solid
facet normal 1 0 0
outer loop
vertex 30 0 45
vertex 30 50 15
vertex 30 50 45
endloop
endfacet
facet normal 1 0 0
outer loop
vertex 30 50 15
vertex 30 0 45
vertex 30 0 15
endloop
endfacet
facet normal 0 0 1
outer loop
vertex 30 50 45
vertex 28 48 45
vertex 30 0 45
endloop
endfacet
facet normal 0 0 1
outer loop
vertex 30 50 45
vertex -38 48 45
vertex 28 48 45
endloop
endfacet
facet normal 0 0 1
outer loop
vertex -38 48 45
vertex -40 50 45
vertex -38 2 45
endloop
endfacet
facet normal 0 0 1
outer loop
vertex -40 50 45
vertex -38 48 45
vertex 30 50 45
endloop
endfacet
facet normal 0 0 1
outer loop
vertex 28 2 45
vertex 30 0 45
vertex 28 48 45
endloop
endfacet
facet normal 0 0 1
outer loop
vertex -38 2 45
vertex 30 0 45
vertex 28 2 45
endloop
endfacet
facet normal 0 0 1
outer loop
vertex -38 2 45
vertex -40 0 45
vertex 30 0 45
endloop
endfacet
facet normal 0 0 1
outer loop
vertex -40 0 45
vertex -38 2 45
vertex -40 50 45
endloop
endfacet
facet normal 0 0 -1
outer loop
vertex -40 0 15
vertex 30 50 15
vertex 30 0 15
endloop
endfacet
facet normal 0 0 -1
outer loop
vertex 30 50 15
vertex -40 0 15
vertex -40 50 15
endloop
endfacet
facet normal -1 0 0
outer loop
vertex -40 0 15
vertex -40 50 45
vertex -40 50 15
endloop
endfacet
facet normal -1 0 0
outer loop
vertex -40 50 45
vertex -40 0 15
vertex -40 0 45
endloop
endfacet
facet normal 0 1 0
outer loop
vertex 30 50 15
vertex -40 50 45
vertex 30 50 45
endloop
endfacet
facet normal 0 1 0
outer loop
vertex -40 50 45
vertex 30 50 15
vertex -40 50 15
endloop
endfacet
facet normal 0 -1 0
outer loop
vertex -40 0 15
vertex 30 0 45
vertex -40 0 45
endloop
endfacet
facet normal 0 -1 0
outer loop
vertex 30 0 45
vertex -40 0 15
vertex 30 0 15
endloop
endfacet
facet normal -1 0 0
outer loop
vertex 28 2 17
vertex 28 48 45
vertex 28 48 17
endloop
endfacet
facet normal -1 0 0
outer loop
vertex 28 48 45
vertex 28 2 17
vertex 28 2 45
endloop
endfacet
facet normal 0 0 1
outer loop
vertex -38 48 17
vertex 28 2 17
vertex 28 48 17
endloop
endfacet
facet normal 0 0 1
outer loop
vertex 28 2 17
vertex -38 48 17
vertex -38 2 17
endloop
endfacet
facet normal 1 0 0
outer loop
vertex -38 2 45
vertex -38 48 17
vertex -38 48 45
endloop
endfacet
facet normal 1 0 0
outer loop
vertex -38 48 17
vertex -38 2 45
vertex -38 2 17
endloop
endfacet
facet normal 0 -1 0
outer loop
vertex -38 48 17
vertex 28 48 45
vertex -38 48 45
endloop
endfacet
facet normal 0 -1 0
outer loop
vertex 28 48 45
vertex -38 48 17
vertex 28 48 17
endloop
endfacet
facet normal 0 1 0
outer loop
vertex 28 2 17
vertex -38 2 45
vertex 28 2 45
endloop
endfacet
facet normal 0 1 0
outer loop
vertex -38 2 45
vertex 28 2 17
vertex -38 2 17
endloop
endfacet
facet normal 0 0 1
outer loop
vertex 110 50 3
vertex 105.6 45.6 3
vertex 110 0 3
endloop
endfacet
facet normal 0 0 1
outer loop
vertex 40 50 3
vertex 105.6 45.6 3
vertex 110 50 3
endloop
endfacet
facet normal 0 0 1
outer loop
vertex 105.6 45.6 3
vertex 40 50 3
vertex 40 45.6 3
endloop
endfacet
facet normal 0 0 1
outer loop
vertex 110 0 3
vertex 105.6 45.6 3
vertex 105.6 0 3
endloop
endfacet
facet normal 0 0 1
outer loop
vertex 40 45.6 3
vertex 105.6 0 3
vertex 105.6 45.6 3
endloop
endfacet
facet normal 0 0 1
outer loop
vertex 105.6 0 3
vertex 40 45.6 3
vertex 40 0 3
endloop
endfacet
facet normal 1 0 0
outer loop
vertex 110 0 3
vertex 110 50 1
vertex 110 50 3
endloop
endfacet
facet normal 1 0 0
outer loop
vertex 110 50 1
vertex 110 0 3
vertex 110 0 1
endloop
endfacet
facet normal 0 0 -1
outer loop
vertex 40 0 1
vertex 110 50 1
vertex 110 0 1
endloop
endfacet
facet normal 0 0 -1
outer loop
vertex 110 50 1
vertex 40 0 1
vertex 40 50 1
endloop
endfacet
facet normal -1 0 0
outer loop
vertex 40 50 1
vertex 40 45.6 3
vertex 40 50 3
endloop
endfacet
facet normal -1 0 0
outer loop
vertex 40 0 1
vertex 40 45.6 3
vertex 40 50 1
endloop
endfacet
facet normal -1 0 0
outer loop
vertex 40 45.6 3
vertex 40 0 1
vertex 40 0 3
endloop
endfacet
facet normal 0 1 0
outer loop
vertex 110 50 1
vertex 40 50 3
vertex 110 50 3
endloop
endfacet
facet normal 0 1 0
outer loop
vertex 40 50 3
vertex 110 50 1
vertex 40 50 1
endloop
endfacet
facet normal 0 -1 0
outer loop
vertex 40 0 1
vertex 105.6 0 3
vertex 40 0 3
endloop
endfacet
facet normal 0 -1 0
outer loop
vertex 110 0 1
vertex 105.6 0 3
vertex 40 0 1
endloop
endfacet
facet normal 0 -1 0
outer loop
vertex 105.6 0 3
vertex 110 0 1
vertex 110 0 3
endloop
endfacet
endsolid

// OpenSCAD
// Two-part enclosure for small electronics board
// Part 1: Box (left)
// Part 2: Lid (right, printed upside down)
// Prints together with a 10mm gap.

$fn = 64;

// --- Dimensions ---

// Part 1: Box
// Outer size X x Y x Z
BOX_OUT_X = 70;
BOX_OUT_Y = 50;
BOX_OUT_Z = 30;
// Wall thickness
BOX_WALL_THICK = 2;
// Floor thickness
BOX_FLOOR_THICK = 2;

// Part 2: Lid
// Plate thickness
LID_PLATE_THICK = 2;
// Lip dimensions
LIP_WALL_THICK = 1.5;
LIP_HEIGHT = 4;
// Lip outer size (slightly smaller than box inner to allow clearance)
LIP_OUT_X = 65.6;
LIP_OUT_Y = 45.6;

// Gap between parts
PART_GAP = 10;

// --- Part 1: Box ---
// Centered at X = - (BOX_OUT_X/2 + PART_GAP/2), Y = 0, Z = 0
// Actually, let's place the Box first, then the Lid.
// Box Center X = - (BOX_OUT_X/2 + PART_GAP/2)
// Box Center Y = 0
// Box Center Z = BOX_OUT_Z / 2 (to sit on bed)

translate([-(BOX_OUT_X/2 + PART_GAP/2), 0, BOX_OUT_Z/2])
difference() {
    // Outer Box
    cube([BOX_OUT_X, BOX_OUT_Y, BOX_OUT_Z]);
    
    // Cut out the inside
    // Inner dimensions
    inner_x = BOX_OUT_X - 2*BOX_WALL_THICK;
    inner_y = BOX_OUT_Y - 2*BOX_WALL_THICK;
    inner_z = BOX_OUT_Z - BOX_FLOOR_THICK; // Open top
    
    translate([BOX_WALL_THICK, BOX_WALL_THICK, BOX_WALL_THICK])
    cube([inner_x, inner_y, inner_z + 0.01]); // +0.01 to ensure clean cut
}

// --- Part 2: Lid ---
// Placed on the +X side of the box.
// Center X = BOX_OUT_X/2 + PART_GAP/2
// Center Y = 0
// Center Z = LID_PLATE_THICK / 2 (sitting on bed)
// Orientation: Printed upside down. 
// This means the "top" of the part (the lip) is facing -Z relative to the part's local geometry if we build it normally,
// but since it sits on the bed, the plate is at Z=0 and the lip goes UP (+Z).
// Wait, "printed upside down" usually implies the part is flipped in the slicer or model.
// If the model is built with the lip going UP, and we print it, the lip is on top.
// If the user says "printed upside down", they might mean the part is inverted in the model so the lip is at the bottom?
// No, "Lid ... printed upside down: a plate ... lying on the bed, with a rectangular lip on top of it".
// This describes the physical result: Plate on bed, Lip on top.
// So the model should be built with the lip extending +Z from the plate.
// The phrase "printed upside down" might refer to the fact that the "inside" of the lid (the hollow part) is facing down?
// No, a lid covers the box. The lip goes over the box.
// Let's assume standard orientation: Plate at Z=0, Lip extends +Z.
// The "upside down" might be a confusion in the prompt, or it means the part is designed such that the "top" surface is the bottom surface of the printed object?
// Let's stick to the geometry description: "plate ... lying on the bed, with a rectangular lip on top of it".
// This means:
// 1. Plate is the base.
// 2. Lip is extruded upwards from the plate.
// 3. The lip fits into the box.

translate([BOX_OUT_X/2 + PART_GAP/2, 0, LID_PLATE_THICK/2])
difference() {
    // Outer shape: Plate + Lip
    // We can model this as a large block and cut the hole, or build it up.
    // Building up is easier for the lip geometry.
    
    // 1. The Plate
    cube([BOX_OUT_X, BOX_OUT_Y, LID_PLATE_THICK]);
    
    // 2. The Lip
    // The lip sits on the plate.
    // Lip Outer Size: LIP_OUT_X x LIP_OUT_Y
    // Lip Wall Thickness: LIP_WALL_THICK
    // Lip Height: LIP_HEIGHT
    // Lip Inner Size: LIP_OUT_X - 2*LIP_WALL_THICK
    
    lip_inner_x = LIP_OUT_X - 2*LIP_WALL_THICK;
    lip_inner_y = LIP_OUT_Y - 2*LIP_WALL_THICK;
    
    // Position the lip on top of the plate
    // Z position: LID_PLATE_THICK
    translate([0, 0, LID_PLATE_THICK])
    union() {
        // The solid block of the lip (including the walls)
        cube([LIP_OUT_X, LIP_OUT_Y, LIP_HEIGHT]);
        
        // The hole in the lip
        // The hole goes through the lip walls.
        // Z range of lip: LID_PLATE_THICK to LID_PLATE_THICK + LIP_HEIGHT
        // Hole Z range: LID_PLATE_THICK + LIP_WALL_THICK (bottom of hole) to LID_PLATE_THICK + LIP_HEIGHT (top)
        // Actually, the hole is inside the lip walls.
        // Bottom of hole is at Z = LID_PLATE_THICK + LIP_WALL_THICK
        // Top of hole is at Z = LID_PLATE_THICK + LIP_HEIGHT
        // We need to cut a hole that is slightly larger than the inner dimensions to ensure fit.
        // Clearance calculation:
        // Box Inner X = 66, Box Inner Y = 46.
        // Lip Outer X = 65.6, Lip Outer Y = 45.6.
        // Lip Inner X = 65.6 - 3 = 62.6.
        // Lip Inner Y = 45.6 - 3 = 42.6.
        // Clearance X = (66 - 62.6)/2 = 1.7mm.
        // Clearance Y = (46 - 42.6)/2 = 1.7mm.
        // This is a very tight fit (1.7mm total clearance). 
        // To ensure it prints and fits, we might want to slightly enlarge the hole in the model 
        // or rely on the user's specific measurements. 
        // The prompt says "0.2 mm clearance on each side". 
        // If we strictly follow "0.2mm clearance", the Lip Inner should be 65.6 x 45.6.
        // But the prompt also says "outer size is 65.6 x 45.6".
        // There is a contradiction. 
        // If Lip Outer is 65.6 and Wall is 1.5, Inner is 62.6.
        // If Inner is 65.6 (for 0.2mm clearance), Wall must be (65.6 - 65.6)/2 = 0? No.
        // If Inner is 65.6 and Outer is 65.6, Wall is 0.
        // If Inner is 65.6 and Wall is 1.5, Outer is 68.6.
        // Given the explicit "outer size 65.6", I will use that. 
        // The resulting clearance is ~1.7mm. This is likely what the user measured.
        // I will use the calculated inner dimensions based on the explicit outer size and wall thickness.
        
        translate([LIP_WALL_THICK, LIP_WALL_THICK, LID_PLATE_THICK + LIP_WALL_THICK])
        cube([lip_inner_x, lip_inner_y, LIP_HEIGHT - LIP_WALL_THICK + 0.01]);
    }
}
